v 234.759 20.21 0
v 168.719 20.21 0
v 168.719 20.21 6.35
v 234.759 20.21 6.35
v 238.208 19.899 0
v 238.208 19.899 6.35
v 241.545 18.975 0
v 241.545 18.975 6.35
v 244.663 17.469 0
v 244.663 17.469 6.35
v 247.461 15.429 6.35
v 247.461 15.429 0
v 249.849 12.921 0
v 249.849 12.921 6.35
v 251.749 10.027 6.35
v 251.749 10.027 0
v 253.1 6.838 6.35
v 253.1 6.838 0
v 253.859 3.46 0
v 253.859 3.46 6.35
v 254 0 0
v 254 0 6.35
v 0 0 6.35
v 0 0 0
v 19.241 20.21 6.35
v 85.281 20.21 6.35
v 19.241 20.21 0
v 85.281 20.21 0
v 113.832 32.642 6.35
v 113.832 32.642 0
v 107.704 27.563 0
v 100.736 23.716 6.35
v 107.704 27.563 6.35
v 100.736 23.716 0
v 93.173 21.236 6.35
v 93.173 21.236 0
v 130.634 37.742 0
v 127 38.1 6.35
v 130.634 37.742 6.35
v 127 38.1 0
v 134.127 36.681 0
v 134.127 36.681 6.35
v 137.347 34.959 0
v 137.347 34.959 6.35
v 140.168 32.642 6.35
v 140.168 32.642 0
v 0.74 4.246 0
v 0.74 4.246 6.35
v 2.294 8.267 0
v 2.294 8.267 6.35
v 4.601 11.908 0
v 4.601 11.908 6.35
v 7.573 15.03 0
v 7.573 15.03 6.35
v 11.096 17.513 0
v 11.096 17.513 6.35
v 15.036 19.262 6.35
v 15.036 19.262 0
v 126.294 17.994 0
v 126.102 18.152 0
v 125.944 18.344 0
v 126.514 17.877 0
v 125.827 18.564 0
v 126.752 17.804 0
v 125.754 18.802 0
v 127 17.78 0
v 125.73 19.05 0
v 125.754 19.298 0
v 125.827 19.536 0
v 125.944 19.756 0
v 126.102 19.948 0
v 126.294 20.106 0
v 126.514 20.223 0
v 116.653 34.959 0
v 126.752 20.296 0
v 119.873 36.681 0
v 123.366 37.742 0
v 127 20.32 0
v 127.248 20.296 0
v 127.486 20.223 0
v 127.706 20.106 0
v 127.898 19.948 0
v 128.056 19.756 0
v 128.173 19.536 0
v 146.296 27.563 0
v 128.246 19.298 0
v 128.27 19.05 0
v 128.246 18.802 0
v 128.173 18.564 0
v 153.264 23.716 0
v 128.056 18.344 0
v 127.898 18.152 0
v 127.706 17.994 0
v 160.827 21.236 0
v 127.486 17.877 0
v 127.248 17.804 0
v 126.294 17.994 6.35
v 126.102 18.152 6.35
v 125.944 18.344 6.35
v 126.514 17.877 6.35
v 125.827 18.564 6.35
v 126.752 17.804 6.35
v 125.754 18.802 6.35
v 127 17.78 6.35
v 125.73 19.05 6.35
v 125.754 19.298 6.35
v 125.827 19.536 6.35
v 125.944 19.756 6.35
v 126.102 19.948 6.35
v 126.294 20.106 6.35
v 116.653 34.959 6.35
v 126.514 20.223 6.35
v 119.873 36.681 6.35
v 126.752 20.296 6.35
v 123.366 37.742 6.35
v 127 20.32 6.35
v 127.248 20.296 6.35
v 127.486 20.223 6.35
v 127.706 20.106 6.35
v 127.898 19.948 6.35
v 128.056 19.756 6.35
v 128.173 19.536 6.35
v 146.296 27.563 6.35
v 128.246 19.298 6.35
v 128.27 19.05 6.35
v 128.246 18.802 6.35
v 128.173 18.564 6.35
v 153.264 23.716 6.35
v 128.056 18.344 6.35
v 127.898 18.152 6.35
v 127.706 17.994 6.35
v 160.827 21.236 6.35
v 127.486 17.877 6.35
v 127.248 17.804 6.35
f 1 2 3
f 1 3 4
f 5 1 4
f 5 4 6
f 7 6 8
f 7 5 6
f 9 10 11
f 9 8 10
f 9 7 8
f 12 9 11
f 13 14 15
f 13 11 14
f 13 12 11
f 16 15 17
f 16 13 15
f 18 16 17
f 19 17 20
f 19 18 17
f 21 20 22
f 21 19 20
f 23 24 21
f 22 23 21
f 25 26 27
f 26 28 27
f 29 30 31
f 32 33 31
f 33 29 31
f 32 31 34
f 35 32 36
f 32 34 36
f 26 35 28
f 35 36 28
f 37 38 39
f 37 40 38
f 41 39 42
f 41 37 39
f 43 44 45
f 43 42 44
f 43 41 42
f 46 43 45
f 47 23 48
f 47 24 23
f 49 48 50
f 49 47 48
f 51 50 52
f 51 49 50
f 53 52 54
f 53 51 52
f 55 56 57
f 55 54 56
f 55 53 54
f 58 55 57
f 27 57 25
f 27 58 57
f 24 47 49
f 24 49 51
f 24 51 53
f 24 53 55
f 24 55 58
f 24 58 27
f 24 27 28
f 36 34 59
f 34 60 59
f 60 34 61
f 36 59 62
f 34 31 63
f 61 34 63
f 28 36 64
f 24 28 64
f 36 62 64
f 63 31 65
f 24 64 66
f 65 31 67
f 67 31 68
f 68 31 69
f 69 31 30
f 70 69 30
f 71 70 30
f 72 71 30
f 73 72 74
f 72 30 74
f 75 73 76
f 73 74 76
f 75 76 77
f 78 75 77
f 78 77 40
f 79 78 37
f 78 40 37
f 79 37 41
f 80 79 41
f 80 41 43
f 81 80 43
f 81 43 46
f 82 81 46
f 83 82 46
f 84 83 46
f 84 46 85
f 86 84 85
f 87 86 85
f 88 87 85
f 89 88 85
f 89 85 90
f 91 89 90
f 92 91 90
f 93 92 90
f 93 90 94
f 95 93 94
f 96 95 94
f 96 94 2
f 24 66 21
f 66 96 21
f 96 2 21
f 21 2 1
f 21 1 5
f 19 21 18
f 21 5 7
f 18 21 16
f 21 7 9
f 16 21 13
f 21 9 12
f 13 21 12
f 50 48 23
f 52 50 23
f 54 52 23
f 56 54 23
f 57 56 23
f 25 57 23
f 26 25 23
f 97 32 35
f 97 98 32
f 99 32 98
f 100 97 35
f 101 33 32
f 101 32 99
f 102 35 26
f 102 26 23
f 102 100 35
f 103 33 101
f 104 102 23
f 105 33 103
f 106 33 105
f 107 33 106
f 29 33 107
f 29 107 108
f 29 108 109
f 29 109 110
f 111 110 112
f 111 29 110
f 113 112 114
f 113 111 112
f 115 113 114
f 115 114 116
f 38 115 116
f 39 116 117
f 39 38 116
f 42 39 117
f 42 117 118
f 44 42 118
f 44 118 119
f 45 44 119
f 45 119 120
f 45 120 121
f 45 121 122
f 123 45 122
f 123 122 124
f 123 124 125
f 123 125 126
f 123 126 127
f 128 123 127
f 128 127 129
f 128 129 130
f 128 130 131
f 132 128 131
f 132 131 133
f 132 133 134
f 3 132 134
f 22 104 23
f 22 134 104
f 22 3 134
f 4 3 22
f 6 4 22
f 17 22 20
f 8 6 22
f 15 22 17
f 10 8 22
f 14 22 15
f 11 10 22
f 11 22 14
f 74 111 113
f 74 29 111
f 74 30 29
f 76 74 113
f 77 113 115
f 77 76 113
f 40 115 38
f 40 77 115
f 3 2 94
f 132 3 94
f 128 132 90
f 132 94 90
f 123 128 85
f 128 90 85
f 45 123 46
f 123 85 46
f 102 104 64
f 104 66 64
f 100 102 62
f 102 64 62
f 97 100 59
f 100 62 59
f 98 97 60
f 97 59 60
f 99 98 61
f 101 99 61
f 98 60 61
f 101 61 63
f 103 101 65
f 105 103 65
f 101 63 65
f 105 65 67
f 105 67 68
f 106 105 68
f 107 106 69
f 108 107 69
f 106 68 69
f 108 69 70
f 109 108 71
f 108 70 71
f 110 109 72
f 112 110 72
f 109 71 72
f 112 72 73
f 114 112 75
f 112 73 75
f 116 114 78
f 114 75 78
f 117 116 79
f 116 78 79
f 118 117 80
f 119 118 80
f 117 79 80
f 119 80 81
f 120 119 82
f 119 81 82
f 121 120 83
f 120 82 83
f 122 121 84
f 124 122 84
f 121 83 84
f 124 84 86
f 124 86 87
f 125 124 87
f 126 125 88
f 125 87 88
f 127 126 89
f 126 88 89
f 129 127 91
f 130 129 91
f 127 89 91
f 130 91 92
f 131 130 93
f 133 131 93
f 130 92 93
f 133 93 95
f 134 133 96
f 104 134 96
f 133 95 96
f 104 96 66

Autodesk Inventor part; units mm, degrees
ref_plane "YZ Plane" through (0, 0, 0) normal (1, 0, 0) x (0, 1, 0)
ref_plane "XZ Plane" through (0, 0, 0) normal (0, 1, 0) x (-1, 0, 0)
ref_plane "XY Plane" through (0, 0, 0) normal (0, 0, 1) x (1, 0, 0)
sketch "Sketch1" plane through (0, 0, 0) normal (0, 0, 1) x (1, 0, 0)
  line L0 (0, 0) -> (254, 0)
  circle A0 centre (127, 20.32) radius 9.652 construction
  line L1 (127, 38.1) -> (127, 0) construction
  arc A1 (85.2807, 20.21) -> (113.8319, 32.6419) centre (83.7743, 62.6708) ccw
  arc A2 (127, 38.1) -> (113.8319, 32.6419) centre (127, 19.4864) ccw
  arc A3 (140.1681, 32.6419) -> (168.7193, 20.21) centre (170.2257, 62.6708) ccw
  arc A4 (140.1681, 32.6419) -> (127, 38.1) centre (127, 19.4864) ccw
  line L2 (85.2807, 20.21) -> (19.2407, 20.21)
  line L3 (168.7193, 20.21) -> (234.7593, 20.21)
  arc A5 (254, 0) -> (234.7593, 20.21) centre (234.7593, 0.9461) ccw
  arc A6 (19.2407, 20.21) -> (0, 0) centre (21.9577, -1.6406) ccw
  dimension "d2" = 19.304
  dimension "d74" = 254
  dimension "d75" = 20.32
  dimension "d76" = 38.1
  dimension "d78" = 42.4876
  dimension "d79" = 18.6136
  dimension "d89" = 66.04
  dimension "d90" = 66.04
  dimension "d91" = 22.0189
  dimension "d92" = 19.2639
  dimension "d93" = 21.8506
extrude "Extrusion2" add sketch "Sketch1" along normal blind 6.35
sketch "Sketch5" plane through (0, 0, 6.35) normal (0, 0, 1) x (1, 0, 0)
  circle A0 centre (127, 19.05) radius 9.652
  line L0 (0, 0) -> (254, 0) projected
  arc A1 (140.1681, 32.6419) -> (113.8319, 32.6419) centre (127, 19.4864) ccw projected
  point P0 (127, 1.27)
  point P1 (127, 38.1)
  dimension "d58" = 19.304
  dimension "d87" = 19.05
hole "Hole3" at (127, 19.05, 6.35) direction (0, 0, -1) diameter 2.54 end through all
properties part number "holder"
